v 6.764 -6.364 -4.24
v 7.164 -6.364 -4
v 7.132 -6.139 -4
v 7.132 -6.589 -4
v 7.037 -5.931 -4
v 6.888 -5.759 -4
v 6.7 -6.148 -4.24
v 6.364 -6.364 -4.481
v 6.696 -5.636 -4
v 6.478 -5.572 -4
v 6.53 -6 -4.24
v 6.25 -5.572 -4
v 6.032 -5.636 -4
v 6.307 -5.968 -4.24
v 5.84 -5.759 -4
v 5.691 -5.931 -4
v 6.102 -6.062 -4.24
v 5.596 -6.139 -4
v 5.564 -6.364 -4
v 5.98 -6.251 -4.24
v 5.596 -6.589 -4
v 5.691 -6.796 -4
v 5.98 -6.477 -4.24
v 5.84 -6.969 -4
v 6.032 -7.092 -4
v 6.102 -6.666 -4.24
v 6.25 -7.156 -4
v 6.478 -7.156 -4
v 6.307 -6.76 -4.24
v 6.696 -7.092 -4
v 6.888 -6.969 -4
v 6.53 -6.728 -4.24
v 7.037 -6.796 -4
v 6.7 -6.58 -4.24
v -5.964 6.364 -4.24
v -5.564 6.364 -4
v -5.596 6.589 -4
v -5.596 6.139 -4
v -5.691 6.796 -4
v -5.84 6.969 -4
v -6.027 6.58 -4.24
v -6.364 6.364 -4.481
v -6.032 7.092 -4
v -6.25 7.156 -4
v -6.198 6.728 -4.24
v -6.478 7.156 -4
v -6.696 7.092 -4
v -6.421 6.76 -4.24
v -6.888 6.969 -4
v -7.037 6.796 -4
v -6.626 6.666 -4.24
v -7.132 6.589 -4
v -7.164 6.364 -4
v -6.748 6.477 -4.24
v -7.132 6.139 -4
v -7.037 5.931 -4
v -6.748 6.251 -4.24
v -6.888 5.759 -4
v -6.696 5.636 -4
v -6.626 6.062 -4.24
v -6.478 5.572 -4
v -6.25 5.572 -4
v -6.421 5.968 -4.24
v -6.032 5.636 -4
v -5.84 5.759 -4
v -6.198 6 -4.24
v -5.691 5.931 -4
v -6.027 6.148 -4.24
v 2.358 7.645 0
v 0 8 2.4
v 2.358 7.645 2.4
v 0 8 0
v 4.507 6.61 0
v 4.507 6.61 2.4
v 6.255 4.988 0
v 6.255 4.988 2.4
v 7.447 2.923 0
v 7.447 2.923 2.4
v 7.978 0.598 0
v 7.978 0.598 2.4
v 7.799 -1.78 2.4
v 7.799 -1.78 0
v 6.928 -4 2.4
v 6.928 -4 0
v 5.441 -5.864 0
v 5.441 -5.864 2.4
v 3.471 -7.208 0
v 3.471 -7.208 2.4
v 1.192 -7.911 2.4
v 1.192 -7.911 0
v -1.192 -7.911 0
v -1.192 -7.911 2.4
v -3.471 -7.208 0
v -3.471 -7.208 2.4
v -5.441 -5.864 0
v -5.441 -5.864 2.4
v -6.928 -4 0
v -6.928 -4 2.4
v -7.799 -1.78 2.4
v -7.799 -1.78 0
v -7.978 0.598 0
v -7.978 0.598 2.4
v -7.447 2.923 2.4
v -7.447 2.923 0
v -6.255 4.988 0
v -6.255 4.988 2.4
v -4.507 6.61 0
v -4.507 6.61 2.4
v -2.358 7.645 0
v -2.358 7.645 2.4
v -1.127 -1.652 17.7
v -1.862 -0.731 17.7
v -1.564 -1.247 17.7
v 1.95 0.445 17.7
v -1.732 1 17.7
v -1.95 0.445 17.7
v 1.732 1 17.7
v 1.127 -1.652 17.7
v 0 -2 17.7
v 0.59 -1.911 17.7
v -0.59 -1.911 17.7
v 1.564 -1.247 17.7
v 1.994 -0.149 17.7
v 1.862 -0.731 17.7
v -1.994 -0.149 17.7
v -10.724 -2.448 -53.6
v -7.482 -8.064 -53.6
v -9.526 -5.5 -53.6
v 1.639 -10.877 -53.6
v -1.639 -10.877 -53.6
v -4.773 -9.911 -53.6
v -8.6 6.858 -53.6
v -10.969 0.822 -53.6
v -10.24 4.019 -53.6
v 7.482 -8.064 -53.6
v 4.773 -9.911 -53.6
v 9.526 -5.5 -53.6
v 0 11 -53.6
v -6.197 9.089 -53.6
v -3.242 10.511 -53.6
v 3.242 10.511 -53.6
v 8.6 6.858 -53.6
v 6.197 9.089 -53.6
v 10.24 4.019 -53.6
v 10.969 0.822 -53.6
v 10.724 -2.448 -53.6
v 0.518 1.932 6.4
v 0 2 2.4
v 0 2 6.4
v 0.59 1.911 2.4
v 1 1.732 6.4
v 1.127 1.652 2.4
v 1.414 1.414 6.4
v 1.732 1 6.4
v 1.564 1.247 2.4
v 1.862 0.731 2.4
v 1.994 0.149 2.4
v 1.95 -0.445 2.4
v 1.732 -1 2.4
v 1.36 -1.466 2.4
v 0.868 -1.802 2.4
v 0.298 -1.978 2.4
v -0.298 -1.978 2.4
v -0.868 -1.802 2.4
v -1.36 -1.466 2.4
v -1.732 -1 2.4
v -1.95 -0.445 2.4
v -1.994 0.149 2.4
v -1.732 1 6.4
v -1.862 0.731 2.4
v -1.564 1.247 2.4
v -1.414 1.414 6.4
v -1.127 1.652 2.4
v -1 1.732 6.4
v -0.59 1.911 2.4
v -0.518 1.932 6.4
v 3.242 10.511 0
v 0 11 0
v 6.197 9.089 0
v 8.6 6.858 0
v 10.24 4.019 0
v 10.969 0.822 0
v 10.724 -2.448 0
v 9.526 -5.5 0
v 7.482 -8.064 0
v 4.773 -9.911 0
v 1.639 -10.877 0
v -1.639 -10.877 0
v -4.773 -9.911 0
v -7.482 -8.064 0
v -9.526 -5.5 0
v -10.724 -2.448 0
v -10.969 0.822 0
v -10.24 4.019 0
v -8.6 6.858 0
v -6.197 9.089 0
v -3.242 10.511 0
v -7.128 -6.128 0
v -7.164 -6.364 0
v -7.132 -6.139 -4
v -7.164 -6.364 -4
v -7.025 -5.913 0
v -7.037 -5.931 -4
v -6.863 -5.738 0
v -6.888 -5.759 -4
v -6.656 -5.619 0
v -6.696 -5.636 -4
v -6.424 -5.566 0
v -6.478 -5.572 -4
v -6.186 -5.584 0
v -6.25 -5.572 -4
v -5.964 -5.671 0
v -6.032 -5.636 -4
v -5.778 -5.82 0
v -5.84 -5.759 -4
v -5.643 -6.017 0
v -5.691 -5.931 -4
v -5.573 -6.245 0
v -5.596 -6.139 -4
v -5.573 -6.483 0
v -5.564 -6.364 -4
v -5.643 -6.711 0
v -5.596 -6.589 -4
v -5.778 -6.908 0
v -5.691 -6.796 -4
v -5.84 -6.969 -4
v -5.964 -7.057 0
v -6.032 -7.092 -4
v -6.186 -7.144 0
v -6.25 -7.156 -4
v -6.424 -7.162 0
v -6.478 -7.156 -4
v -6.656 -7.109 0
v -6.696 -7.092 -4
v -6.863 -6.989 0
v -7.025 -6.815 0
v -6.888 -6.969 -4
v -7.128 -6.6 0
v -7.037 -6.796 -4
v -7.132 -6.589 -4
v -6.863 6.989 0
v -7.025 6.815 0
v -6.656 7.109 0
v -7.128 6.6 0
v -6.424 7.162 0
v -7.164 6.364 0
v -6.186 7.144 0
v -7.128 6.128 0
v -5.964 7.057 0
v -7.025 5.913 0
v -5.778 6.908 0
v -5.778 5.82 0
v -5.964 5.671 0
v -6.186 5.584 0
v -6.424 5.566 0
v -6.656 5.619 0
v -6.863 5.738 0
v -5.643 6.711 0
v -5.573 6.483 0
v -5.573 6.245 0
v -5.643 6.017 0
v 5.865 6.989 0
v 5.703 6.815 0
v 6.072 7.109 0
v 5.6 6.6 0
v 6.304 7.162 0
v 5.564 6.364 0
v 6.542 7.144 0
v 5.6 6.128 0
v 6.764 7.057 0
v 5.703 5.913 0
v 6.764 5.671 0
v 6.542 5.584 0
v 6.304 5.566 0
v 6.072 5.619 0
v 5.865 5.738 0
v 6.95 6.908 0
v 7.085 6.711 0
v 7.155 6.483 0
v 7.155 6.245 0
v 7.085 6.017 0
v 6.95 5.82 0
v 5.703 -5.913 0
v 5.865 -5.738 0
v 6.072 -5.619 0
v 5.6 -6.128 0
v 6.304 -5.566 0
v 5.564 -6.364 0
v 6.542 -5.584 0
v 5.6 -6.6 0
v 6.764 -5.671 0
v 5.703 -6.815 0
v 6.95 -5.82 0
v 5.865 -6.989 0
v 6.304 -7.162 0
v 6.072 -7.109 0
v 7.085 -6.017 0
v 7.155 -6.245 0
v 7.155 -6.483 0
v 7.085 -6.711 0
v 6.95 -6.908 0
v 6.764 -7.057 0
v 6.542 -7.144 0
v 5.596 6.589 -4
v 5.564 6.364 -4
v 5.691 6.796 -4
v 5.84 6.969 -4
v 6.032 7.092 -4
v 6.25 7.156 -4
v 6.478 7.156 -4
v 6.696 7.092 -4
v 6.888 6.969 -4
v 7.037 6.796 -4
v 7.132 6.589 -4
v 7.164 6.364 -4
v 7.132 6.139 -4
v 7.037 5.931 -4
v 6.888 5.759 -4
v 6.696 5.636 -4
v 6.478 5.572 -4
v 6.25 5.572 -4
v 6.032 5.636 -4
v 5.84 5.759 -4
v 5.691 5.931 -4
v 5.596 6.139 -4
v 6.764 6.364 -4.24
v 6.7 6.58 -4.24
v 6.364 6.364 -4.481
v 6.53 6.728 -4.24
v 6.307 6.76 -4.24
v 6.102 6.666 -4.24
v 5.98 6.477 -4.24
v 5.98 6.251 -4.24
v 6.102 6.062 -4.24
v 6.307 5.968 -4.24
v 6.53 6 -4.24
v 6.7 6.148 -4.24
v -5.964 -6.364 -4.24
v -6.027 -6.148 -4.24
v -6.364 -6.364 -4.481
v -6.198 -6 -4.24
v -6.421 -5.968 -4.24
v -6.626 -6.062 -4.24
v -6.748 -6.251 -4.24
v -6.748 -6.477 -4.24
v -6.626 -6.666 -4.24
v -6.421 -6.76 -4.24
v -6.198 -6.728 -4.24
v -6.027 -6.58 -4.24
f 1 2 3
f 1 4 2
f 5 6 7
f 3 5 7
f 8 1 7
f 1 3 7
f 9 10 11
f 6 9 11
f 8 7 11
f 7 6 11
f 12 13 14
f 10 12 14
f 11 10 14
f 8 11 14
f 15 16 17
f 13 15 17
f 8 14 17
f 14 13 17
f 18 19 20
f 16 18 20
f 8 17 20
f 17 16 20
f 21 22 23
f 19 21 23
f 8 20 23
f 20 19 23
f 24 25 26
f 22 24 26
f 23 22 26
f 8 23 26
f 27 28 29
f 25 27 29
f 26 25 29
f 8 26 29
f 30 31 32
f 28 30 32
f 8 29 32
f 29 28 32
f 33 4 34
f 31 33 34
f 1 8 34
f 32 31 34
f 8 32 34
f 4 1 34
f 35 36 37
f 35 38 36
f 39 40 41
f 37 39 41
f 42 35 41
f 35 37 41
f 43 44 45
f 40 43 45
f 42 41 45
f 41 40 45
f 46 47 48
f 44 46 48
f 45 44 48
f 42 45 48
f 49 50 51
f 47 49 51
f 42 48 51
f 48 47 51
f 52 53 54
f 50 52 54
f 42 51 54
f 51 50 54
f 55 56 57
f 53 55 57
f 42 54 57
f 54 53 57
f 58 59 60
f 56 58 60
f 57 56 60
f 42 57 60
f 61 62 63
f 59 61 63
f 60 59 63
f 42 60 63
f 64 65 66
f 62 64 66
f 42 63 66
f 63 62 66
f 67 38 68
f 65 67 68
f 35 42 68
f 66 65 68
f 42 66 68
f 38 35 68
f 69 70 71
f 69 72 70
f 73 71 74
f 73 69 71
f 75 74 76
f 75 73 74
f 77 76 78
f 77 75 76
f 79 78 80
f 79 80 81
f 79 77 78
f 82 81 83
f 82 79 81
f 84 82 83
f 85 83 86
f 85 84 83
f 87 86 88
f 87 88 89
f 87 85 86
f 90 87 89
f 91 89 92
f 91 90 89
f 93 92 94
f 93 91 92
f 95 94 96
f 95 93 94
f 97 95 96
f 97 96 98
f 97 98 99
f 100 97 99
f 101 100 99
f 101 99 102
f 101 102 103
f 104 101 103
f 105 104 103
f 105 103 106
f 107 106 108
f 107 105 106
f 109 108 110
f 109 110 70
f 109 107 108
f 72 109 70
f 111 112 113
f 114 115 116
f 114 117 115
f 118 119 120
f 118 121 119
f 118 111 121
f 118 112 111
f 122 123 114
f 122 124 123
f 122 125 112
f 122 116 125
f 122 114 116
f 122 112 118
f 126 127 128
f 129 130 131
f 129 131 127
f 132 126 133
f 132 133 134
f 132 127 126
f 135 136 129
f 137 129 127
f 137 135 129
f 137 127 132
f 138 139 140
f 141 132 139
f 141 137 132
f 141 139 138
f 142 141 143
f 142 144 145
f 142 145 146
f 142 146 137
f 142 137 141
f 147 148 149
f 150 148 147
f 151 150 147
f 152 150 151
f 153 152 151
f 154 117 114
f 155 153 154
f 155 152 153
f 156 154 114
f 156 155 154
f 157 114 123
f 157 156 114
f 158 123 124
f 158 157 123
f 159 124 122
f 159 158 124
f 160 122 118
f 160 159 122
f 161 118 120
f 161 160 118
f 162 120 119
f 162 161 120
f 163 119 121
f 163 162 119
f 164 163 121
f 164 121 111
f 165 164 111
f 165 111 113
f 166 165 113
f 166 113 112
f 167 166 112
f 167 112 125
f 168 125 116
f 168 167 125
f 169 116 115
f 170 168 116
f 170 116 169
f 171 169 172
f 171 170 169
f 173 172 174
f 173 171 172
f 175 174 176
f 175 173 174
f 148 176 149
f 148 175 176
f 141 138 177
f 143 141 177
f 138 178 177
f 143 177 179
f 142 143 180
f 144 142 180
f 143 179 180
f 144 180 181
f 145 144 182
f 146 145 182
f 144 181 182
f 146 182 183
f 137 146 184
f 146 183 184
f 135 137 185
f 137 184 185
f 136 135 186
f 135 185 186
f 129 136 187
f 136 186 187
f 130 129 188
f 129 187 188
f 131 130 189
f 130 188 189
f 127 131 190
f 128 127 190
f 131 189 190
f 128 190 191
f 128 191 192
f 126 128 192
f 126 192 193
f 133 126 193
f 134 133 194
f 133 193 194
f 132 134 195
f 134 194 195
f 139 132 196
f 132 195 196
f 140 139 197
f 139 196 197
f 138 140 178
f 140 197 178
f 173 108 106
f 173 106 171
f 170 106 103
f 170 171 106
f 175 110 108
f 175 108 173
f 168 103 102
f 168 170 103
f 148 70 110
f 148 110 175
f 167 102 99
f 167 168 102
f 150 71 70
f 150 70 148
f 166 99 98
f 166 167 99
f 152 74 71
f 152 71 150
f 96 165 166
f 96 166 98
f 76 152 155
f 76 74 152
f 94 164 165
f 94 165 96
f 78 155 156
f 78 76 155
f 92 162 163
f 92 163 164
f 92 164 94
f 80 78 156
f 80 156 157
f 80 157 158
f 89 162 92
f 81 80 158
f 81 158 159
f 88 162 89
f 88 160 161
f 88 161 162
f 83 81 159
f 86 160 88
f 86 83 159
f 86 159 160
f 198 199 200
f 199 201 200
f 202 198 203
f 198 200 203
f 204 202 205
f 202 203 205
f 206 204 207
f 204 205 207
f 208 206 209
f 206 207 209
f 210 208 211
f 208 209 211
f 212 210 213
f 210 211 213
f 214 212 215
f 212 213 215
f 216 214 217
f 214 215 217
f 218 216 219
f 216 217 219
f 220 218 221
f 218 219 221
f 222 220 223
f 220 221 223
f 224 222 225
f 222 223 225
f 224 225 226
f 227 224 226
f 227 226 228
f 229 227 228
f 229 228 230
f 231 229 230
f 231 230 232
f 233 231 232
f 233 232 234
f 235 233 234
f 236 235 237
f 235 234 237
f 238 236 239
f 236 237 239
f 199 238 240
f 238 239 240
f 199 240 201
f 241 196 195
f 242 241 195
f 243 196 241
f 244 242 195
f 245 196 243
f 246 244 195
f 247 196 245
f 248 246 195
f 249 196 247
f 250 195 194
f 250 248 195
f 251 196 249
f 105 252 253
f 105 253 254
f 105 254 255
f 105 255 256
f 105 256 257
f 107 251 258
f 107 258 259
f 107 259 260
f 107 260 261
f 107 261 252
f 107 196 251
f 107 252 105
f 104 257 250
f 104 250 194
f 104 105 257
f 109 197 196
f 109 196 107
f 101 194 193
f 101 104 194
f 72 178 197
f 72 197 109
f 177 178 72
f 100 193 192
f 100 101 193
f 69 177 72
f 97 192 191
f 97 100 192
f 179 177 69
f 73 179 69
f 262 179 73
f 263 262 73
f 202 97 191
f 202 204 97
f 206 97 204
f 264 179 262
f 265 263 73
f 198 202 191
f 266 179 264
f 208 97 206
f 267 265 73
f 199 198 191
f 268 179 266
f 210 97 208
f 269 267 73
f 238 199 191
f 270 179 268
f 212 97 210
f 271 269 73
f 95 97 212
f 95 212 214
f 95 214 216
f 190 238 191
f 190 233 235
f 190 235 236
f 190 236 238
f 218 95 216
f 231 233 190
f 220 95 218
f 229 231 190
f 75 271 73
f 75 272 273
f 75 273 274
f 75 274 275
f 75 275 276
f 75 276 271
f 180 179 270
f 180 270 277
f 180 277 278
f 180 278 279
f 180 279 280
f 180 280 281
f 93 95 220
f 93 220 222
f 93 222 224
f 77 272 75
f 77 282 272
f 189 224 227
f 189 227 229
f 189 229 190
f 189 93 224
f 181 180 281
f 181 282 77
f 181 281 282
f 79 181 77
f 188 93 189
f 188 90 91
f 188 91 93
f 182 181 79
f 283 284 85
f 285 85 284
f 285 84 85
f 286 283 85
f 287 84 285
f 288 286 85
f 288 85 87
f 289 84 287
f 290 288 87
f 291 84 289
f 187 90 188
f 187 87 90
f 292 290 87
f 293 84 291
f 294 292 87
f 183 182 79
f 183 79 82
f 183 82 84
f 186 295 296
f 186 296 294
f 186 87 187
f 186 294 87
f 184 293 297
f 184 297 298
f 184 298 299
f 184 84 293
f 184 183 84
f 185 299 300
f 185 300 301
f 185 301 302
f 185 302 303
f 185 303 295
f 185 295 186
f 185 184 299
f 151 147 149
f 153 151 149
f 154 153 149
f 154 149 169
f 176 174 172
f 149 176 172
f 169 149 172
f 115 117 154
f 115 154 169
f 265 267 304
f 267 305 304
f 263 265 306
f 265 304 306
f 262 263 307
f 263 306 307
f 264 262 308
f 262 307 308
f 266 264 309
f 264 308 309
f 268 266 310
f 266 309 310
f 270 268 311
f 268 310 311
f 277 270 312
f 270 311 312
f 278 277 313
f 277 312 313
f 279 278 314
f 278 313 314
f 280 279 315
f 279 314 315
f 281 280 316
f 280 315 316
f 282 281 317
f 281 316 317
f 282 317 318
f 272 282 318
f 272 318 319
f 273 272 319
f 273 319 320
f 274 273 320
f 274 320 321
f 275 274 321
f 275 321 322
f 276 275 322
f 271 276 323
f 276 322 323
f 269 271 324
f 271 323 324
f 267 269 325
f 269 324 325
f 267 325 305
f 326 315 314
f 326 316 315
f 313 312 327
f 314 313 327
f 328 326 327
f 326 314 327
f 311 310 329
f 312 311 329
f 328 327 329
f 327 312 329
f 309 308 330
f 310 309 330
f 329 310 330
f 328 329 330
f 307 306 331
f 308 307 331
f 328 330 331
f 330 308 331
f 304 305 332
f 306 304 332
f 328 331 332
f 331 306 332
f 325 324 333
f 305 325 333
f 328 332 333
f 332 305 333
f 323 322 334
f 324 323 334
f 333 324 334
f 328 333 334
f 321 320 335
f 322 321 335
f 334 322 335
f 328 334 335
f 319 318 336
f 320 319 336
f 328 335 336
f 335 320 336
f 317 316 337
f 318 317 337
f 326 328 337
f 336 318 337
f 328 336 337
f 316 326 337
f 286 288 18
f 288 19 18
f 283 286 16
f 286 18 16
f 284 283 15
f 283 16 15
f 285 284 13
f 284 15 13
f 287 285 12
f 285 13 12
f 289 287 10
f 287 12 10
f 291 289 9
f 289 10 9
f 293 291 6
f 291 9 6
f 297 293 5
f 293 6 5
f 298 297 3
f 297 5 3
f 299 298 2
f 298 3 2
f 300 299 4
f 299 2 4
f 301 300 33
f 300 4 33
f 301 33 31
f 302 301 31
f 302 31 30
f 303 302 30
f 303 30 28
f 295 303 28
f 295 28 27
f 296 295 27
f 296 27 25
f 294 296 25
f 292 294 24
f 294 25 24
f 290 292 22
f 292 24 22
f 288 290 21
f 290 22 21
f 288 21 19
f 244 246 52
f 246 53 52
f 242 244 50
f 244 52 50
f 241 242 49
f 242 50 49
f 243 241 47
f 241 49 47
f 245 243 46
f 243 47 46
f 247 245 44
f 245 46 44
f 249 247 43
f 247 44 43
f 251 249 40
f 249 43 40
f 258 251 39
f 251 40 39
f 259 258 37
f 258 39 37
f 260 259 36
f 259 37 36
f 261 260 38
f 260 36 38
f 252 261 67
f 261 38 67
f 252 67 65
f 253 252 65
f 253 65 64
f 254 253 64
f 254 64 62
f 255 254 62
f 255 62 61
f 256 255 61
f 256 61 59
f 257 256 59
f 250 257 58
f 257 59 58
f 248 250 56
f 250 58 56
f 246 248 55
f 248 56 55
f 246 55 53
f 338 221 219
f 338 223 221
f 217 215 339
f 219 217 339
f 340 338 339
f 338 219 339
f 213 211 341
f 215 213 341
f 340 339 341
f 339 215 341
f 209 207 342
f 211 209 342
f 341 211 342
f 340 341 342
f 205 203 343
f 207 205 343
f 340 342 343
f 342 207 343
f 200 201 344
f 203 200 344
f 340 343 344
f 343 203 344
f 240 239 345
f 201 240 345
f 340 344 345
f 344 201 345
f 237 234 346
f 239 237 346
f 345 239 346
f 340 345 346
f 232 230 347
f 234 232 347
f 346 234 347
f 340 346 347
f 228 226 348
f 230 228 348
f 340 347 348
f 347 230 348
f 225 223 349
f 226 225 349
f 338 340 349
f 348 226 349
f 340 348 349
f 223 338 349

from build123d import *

# Parameters (mm, degrees)
CUT_EXTRUDE1_DEPTH              = 11.3
TAP_DRILL_FOR_M2X0_4_TAP1_D     = 1.6
TAP_DRILL_FOR_M2X0_4_TAP1_DEPTH = 4
TAP_DRILL_FOR_M2X0_4_TAP1_TIP   = 0.480688495


with BuildPart() as part:
    # Sketch4 → Revolve1 (revolve)
    with BuildSketch(Plane(origin=(0, 0, 0), x_dir=(0, 0, -1), z_dir=(1, 0, 0))):
        Polygon((0, 8), (0, 11), (21.4, 11), (53.6, 11), (53.6, 0), (0, 0), (-17.7, 0), (-17.7, 2), (-2.4, 2), (-2.4, 8), align=None)
    revolve(axis=Axis((0, 0, 0), (0, 0, -1)))

    # Sketch5 → Cut-Extrude1 (cut)
    with BuildSketch(Plane.XY.offset(17.7)):
        with BuildLine():
            Line((1.732050808, 1), (-1.732050808, 1))
            ThreePointArc((-1.732050808, 1), (-1, 1.732050808), (0, 2))
            ThreePointArc((0, 2), (1, 1.732050808), (1.732050808, 1))
        make_face()
    extrude(amount=-CUT_EXTRUDE1_DEPTH, mode=Mode.SUBTRACT)

    # Tap Drill for M2x0.4 Tap1
    with Locations(Plane.XY):
        with Locations((6.363961031, 6.363961031), (6.363961031, -6.363961031), (-6.363961031, -6.363961031), (-6.363961031, 6.363961031)):
            Hole(TAP_DRILL_FOR_M2X0_4_TAP1_D / 2, depth=TAP_DRILL_FOR_M2X0_4_TAP1_DEPTH)
            with Locations((0, 0, -(TAP_DRILL_FOR_M2X0_4_TAP1_DEPTH + TAP_DRILL_FOR_M2X0_4_TAP1_TIP / 2))):  # 118° drill point
                Cone(0, TAP_DRILL_FOR_M2X0_4_TAP1_D / 2, TAP_DRILL_FOR_M2X0_4_TAP1_TIP, mode=Mode.SUBTRACT)


solid = part.part
